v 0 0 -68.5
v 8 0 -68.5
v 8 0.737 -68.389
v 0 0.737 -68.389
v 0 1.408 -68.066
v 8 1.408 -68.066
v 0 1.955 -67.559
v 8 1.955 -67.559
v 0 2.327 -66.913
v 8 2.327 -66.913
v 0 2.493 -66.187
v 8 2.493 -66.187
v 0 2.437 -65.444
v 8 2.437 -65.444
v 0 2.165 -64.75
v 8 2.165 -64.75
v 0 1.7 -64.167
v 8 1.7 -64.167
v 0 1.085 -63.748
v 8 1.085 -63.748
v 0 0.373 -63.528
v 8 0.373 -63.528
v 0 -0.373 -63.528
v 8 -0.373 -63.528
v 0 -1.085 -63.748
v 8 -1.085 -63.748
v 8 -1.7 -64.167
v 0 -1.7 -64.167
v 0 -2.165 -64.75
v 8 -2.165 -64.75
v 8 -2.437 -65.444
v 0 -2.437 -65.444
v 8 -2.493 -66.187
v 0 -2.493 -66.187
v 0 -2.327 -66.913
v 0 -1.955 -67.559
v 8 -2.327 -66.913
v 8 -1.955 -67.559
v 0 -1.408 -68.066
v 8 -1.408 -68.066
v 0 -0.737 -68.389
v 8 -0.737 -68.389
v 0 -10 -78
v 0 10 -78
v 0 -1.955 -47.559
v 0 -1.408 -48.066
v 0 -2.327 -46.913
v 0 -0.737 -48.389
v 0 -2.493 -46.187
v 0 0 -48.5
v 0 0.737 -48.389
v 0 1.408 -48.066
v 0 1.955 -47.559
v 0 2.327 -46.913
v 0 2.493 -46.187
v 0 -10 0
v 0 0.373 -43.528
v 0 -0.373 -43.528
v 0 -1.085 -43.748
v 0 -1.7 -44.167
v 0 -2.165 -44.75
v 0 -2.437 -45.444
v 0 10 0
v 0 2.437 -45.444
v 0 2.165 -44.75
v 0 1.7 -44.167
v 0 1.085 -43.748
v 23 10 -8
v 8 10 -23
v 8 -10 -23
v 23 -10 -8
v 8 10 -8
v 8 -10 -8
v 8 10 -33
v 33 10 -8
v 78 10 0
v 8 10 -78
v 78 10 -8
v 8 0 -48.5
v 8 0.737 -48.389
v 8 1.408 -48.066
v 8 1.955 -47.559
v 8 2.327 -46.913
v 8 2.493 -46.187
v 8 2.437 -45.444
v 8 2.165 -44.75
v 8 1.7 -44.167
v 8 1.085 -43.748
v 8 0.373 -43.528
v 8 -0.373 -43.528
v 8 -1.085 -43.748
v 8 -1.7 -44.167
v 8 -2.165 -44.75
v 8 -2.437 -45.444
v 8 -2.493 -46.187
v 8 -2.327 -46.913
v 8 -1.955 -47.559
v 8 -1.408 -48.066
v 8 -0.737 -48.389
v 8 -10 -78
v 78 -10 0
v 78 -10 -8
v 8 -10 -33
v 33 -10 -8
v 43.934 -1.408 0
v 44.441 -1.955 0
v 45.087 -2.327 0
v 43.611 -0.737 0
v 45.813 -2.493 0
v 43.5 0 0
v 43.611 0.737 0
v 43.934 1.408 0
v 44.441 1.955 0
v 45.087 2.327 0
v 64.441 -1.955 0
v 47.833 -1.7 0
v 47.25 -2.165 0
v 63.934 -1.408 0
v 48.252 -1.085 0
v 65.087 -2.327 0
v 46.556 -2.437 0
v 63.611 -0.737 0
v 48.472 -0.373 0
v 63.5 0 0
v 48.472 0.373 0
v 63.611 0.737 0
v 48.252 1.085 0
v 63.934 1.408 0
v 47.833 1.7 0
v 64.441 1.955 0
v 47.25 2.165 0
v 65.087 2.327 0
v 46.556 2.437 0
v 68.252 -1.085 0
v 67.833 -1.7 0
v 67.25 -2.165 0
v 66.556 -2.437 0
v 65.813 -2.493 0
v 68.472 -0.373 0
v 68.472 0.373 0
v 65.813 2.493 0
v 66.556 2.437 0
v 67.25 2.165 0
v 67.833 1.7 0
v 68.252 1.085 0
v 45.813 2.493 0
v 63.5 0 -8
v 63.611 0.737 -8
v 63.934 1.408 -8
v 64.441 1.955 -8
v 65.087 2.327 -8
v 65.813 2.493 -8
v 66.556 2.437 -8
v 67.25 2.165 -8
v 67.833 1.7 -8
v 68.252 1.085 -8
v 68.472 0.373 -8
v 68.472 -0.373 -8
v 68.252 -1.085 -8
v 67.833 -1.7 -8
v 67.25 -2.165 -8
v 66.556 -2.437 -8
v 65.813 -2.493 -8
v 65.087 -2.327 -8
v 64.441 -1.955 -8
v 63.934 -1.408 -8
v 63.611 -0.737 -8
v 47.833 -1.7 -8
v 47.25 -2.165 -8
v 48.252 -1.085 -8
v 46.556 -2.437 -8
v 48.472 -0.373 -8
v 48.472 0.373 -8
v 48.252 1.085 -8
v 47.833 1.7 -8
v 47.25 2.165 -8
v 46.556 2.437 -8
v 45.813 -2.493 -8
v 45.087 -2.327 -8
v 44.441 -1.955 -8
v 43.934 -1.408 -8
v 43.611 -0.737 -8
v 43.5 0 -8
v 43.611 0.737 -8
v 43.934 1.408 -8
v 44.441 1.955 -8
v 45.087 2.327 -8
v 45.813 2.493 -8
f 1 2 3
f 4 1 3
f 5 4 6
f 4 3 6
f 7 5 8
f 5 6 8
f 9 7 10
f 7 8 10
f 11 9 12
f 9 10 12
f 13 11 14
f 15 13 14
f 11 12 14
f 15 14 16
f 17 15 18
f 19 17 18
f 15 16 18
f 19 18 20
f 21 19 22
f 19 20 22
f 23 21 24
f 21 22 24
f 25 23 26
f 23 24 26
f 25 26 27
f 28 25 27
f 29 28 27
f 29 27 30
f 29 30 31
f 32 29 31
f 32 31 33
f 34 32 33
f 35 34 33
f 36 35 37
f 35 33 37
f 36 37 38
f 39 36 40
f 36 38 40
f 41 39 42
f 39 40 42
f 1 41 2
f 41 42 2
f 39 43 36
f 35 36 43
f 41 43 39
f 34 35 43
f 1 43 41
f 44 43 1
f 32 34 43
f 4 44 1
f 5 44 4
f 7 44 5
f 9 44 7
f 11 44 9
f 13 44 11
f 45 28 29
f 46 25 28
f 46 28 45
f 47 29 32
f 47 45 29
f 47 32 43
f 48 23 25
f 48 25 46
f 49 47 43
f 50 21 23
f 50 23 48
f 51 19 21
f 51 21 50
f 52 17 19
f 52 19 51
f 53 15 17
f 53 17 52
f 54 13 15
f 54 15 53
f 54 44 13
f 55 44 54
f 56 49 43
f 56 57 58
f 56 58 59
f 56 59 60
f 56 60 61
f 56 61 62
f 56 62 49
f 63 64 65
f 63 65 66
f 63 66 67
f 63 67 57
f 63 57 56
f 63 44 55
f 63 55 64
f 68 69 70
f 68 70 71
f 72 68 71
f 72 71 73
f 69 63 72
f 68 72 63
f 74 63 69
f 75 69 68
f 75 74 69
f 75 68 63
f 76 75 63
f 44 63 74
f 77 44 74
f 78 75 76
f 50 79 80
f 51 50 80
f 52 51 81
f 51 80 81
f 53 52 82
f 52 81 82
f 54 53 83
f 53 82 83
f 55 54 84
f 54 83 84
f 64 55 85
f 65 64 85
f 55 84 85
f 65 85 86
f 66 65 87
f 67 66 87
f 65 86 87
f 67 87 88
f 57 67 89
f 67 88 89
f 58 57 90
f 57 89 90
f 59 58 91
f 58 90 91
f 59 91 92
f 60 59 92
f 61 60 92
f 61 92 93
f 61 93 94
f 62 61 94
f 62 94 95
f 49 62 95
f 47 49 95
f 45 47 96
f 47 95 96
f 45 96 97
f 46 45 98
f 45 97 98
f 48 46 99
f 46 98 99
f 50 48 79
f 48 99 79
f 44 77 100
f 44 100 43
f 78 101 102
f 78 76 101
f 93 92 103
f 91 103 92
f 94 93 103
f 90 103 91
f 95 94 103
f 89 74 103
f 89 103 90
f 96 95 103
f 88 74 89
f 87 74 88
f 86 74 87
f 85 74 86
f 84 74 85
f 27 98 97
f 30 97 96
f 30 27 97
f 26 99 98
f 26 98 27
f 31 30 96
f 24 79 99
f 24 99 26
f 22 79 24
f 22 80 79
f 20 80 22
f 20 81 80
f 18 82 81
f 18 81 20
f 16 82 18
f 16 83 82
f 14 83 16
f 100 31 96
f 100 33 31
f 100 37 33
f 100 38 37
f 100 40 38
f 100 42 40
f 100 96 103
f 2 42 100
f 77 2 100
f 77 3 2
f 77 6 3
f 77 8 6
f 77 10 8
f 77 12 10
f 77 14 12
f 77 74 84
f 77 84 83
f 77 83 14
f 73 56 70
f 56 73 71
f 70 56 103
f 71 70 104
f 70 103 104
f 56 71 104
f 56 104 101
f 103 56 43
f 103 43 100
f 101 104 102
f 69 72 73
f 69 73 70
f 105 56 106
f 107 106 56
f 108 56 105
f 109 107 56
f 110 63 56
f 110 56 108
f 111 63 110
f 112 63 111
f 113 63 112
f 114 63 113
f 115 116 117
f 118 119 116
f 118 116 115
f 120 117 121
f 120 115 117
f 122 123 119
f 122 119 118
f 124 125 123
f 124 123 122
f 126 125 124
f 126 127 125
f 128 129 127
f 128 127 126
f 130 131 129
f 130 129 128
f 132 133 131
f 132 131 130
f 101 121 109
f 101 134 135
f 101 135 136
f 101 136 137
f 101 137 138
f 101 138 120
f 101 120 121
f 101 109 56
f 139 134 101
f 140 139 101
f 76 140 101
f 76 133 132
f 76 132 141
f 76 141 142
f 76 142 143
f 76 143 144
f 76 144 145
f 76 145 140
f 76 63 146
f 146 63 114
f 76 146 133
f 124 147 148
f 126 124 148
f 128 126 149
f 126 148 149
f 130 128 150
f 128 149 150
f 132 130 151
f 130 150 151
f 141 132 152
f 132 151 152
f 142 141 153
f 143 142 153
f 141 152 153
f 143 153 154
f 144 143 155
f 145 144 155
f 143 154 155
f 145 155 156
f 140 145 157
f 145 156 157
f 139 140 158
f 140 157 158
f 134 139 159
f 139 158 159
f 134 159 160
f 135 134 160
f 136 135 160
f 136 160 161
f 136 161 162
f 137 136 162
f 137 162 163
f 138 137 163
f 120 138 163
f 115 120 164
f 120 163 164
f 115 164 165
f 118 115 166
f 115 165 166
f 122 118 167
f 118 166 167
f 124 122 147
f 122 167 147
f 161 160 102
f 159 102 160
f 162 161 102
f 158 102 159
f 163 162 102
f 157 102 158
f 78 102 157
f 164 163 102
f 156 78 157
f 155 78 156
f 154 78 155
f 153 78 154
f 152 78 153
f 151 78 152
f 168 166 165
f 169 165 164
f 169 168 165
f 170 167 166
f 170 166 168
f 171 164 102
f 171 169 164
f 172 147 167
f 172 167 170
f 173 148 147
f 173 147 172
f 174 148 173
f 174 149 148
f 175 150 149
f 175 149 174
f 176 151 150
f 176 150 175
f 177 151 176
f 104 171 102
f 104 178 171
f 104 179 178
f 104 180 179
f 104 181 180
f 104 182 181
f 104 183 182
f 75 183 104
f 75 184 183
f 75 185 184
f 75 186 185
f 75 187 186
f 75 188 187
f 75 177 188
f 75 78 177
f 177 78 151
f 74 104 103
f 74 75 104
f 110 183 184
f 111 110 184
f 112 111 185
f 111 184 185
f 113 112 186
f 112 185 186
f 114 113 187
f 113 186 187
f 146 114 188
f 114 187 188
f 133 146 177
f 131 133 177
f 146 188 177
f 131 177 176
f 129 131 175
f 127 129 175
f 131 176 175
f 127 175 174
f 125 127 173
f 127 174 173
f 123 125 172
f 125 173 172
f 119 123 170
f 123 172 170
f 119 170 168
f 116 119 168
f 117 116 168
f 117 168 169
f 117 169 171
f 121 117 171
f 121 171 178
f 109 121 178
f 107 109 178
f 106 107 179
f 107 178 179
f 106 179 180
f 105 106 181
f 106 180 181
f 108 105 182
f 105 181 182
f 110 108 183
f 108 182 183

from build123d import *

# Parameters (mm, degrees)
BOSS_EXTRUDE1_DEPTH = 10
BOSS_EXTRUDE2_DEPTH = 10
SKETCH2_R           = 2.5
CUT_EXTRUDE1_DEPTH  = 8
SKETCH3_R           = 2.5
CUT_EXTRUDE2_DEPTH  = 8


with BuildPart() as part:
    # Sketch1 → Boss-Extrude1 (new, symmetric)
    with BuildSketch(Plane(origin=(0, 0, 0), x_dir=(1, 0, 0), z_dir=(0, 1, 0))):
        Polygon((8, 8), (8, 23), (8, 33), (8, 78), (0, 78), (0, 0), (78, 0), (78, 8), (33, 8), (23, 8), align=None)
    extrude(amount=BOSS_EXTRUDE1_DEPTH, both=True)

    # Sketch1<3> → Boss-Extrude2 (add, symmetric)
    with BuildSketch(Plane(origin=(0, 0, 0), x_dir=(1, 0, 0), z_dir=(0, 1, 0))):
        Polygon((8, 33), (8, 23), (23, 8), (33, 8), align=None)
    extrude(amount=BOSS_EXTRUDE2_DEPTH, both=True)

    # Sketch2 → Cut-Extrude1 (cut)
    with BuildSketch(Plane(origin=(8, 0, 0), x_dir=(0, 0, -1), z_dir=(1, 0, 0))):
        with Locations((46, 0)):
            Circle(SKETCH2_R)
        with Locations((66, 0)):
            Circle(SKETCH2_R)
    extrude(amount=-CUT_EXTRUDE1_DEPTH, mode=Mode.SUBTRACT)

    # Sketch3 → Cut-Extrude2 (cut)
    with BuildSketch(Plane(origin=(0, 0, -8), x_dir=(-1, 0, 0), z_dir=(0, 0, -1))):
        with Locations((-66, 0)):
            Circle(SKETCH3_R)
        with Locations((-46, 0)):
            Circle(SKETCH3_R)
    extrude(amount=-CUT_EXTRUDE2_DEPTH, mode=Mode.SUBTRACT)


solid = part.part
